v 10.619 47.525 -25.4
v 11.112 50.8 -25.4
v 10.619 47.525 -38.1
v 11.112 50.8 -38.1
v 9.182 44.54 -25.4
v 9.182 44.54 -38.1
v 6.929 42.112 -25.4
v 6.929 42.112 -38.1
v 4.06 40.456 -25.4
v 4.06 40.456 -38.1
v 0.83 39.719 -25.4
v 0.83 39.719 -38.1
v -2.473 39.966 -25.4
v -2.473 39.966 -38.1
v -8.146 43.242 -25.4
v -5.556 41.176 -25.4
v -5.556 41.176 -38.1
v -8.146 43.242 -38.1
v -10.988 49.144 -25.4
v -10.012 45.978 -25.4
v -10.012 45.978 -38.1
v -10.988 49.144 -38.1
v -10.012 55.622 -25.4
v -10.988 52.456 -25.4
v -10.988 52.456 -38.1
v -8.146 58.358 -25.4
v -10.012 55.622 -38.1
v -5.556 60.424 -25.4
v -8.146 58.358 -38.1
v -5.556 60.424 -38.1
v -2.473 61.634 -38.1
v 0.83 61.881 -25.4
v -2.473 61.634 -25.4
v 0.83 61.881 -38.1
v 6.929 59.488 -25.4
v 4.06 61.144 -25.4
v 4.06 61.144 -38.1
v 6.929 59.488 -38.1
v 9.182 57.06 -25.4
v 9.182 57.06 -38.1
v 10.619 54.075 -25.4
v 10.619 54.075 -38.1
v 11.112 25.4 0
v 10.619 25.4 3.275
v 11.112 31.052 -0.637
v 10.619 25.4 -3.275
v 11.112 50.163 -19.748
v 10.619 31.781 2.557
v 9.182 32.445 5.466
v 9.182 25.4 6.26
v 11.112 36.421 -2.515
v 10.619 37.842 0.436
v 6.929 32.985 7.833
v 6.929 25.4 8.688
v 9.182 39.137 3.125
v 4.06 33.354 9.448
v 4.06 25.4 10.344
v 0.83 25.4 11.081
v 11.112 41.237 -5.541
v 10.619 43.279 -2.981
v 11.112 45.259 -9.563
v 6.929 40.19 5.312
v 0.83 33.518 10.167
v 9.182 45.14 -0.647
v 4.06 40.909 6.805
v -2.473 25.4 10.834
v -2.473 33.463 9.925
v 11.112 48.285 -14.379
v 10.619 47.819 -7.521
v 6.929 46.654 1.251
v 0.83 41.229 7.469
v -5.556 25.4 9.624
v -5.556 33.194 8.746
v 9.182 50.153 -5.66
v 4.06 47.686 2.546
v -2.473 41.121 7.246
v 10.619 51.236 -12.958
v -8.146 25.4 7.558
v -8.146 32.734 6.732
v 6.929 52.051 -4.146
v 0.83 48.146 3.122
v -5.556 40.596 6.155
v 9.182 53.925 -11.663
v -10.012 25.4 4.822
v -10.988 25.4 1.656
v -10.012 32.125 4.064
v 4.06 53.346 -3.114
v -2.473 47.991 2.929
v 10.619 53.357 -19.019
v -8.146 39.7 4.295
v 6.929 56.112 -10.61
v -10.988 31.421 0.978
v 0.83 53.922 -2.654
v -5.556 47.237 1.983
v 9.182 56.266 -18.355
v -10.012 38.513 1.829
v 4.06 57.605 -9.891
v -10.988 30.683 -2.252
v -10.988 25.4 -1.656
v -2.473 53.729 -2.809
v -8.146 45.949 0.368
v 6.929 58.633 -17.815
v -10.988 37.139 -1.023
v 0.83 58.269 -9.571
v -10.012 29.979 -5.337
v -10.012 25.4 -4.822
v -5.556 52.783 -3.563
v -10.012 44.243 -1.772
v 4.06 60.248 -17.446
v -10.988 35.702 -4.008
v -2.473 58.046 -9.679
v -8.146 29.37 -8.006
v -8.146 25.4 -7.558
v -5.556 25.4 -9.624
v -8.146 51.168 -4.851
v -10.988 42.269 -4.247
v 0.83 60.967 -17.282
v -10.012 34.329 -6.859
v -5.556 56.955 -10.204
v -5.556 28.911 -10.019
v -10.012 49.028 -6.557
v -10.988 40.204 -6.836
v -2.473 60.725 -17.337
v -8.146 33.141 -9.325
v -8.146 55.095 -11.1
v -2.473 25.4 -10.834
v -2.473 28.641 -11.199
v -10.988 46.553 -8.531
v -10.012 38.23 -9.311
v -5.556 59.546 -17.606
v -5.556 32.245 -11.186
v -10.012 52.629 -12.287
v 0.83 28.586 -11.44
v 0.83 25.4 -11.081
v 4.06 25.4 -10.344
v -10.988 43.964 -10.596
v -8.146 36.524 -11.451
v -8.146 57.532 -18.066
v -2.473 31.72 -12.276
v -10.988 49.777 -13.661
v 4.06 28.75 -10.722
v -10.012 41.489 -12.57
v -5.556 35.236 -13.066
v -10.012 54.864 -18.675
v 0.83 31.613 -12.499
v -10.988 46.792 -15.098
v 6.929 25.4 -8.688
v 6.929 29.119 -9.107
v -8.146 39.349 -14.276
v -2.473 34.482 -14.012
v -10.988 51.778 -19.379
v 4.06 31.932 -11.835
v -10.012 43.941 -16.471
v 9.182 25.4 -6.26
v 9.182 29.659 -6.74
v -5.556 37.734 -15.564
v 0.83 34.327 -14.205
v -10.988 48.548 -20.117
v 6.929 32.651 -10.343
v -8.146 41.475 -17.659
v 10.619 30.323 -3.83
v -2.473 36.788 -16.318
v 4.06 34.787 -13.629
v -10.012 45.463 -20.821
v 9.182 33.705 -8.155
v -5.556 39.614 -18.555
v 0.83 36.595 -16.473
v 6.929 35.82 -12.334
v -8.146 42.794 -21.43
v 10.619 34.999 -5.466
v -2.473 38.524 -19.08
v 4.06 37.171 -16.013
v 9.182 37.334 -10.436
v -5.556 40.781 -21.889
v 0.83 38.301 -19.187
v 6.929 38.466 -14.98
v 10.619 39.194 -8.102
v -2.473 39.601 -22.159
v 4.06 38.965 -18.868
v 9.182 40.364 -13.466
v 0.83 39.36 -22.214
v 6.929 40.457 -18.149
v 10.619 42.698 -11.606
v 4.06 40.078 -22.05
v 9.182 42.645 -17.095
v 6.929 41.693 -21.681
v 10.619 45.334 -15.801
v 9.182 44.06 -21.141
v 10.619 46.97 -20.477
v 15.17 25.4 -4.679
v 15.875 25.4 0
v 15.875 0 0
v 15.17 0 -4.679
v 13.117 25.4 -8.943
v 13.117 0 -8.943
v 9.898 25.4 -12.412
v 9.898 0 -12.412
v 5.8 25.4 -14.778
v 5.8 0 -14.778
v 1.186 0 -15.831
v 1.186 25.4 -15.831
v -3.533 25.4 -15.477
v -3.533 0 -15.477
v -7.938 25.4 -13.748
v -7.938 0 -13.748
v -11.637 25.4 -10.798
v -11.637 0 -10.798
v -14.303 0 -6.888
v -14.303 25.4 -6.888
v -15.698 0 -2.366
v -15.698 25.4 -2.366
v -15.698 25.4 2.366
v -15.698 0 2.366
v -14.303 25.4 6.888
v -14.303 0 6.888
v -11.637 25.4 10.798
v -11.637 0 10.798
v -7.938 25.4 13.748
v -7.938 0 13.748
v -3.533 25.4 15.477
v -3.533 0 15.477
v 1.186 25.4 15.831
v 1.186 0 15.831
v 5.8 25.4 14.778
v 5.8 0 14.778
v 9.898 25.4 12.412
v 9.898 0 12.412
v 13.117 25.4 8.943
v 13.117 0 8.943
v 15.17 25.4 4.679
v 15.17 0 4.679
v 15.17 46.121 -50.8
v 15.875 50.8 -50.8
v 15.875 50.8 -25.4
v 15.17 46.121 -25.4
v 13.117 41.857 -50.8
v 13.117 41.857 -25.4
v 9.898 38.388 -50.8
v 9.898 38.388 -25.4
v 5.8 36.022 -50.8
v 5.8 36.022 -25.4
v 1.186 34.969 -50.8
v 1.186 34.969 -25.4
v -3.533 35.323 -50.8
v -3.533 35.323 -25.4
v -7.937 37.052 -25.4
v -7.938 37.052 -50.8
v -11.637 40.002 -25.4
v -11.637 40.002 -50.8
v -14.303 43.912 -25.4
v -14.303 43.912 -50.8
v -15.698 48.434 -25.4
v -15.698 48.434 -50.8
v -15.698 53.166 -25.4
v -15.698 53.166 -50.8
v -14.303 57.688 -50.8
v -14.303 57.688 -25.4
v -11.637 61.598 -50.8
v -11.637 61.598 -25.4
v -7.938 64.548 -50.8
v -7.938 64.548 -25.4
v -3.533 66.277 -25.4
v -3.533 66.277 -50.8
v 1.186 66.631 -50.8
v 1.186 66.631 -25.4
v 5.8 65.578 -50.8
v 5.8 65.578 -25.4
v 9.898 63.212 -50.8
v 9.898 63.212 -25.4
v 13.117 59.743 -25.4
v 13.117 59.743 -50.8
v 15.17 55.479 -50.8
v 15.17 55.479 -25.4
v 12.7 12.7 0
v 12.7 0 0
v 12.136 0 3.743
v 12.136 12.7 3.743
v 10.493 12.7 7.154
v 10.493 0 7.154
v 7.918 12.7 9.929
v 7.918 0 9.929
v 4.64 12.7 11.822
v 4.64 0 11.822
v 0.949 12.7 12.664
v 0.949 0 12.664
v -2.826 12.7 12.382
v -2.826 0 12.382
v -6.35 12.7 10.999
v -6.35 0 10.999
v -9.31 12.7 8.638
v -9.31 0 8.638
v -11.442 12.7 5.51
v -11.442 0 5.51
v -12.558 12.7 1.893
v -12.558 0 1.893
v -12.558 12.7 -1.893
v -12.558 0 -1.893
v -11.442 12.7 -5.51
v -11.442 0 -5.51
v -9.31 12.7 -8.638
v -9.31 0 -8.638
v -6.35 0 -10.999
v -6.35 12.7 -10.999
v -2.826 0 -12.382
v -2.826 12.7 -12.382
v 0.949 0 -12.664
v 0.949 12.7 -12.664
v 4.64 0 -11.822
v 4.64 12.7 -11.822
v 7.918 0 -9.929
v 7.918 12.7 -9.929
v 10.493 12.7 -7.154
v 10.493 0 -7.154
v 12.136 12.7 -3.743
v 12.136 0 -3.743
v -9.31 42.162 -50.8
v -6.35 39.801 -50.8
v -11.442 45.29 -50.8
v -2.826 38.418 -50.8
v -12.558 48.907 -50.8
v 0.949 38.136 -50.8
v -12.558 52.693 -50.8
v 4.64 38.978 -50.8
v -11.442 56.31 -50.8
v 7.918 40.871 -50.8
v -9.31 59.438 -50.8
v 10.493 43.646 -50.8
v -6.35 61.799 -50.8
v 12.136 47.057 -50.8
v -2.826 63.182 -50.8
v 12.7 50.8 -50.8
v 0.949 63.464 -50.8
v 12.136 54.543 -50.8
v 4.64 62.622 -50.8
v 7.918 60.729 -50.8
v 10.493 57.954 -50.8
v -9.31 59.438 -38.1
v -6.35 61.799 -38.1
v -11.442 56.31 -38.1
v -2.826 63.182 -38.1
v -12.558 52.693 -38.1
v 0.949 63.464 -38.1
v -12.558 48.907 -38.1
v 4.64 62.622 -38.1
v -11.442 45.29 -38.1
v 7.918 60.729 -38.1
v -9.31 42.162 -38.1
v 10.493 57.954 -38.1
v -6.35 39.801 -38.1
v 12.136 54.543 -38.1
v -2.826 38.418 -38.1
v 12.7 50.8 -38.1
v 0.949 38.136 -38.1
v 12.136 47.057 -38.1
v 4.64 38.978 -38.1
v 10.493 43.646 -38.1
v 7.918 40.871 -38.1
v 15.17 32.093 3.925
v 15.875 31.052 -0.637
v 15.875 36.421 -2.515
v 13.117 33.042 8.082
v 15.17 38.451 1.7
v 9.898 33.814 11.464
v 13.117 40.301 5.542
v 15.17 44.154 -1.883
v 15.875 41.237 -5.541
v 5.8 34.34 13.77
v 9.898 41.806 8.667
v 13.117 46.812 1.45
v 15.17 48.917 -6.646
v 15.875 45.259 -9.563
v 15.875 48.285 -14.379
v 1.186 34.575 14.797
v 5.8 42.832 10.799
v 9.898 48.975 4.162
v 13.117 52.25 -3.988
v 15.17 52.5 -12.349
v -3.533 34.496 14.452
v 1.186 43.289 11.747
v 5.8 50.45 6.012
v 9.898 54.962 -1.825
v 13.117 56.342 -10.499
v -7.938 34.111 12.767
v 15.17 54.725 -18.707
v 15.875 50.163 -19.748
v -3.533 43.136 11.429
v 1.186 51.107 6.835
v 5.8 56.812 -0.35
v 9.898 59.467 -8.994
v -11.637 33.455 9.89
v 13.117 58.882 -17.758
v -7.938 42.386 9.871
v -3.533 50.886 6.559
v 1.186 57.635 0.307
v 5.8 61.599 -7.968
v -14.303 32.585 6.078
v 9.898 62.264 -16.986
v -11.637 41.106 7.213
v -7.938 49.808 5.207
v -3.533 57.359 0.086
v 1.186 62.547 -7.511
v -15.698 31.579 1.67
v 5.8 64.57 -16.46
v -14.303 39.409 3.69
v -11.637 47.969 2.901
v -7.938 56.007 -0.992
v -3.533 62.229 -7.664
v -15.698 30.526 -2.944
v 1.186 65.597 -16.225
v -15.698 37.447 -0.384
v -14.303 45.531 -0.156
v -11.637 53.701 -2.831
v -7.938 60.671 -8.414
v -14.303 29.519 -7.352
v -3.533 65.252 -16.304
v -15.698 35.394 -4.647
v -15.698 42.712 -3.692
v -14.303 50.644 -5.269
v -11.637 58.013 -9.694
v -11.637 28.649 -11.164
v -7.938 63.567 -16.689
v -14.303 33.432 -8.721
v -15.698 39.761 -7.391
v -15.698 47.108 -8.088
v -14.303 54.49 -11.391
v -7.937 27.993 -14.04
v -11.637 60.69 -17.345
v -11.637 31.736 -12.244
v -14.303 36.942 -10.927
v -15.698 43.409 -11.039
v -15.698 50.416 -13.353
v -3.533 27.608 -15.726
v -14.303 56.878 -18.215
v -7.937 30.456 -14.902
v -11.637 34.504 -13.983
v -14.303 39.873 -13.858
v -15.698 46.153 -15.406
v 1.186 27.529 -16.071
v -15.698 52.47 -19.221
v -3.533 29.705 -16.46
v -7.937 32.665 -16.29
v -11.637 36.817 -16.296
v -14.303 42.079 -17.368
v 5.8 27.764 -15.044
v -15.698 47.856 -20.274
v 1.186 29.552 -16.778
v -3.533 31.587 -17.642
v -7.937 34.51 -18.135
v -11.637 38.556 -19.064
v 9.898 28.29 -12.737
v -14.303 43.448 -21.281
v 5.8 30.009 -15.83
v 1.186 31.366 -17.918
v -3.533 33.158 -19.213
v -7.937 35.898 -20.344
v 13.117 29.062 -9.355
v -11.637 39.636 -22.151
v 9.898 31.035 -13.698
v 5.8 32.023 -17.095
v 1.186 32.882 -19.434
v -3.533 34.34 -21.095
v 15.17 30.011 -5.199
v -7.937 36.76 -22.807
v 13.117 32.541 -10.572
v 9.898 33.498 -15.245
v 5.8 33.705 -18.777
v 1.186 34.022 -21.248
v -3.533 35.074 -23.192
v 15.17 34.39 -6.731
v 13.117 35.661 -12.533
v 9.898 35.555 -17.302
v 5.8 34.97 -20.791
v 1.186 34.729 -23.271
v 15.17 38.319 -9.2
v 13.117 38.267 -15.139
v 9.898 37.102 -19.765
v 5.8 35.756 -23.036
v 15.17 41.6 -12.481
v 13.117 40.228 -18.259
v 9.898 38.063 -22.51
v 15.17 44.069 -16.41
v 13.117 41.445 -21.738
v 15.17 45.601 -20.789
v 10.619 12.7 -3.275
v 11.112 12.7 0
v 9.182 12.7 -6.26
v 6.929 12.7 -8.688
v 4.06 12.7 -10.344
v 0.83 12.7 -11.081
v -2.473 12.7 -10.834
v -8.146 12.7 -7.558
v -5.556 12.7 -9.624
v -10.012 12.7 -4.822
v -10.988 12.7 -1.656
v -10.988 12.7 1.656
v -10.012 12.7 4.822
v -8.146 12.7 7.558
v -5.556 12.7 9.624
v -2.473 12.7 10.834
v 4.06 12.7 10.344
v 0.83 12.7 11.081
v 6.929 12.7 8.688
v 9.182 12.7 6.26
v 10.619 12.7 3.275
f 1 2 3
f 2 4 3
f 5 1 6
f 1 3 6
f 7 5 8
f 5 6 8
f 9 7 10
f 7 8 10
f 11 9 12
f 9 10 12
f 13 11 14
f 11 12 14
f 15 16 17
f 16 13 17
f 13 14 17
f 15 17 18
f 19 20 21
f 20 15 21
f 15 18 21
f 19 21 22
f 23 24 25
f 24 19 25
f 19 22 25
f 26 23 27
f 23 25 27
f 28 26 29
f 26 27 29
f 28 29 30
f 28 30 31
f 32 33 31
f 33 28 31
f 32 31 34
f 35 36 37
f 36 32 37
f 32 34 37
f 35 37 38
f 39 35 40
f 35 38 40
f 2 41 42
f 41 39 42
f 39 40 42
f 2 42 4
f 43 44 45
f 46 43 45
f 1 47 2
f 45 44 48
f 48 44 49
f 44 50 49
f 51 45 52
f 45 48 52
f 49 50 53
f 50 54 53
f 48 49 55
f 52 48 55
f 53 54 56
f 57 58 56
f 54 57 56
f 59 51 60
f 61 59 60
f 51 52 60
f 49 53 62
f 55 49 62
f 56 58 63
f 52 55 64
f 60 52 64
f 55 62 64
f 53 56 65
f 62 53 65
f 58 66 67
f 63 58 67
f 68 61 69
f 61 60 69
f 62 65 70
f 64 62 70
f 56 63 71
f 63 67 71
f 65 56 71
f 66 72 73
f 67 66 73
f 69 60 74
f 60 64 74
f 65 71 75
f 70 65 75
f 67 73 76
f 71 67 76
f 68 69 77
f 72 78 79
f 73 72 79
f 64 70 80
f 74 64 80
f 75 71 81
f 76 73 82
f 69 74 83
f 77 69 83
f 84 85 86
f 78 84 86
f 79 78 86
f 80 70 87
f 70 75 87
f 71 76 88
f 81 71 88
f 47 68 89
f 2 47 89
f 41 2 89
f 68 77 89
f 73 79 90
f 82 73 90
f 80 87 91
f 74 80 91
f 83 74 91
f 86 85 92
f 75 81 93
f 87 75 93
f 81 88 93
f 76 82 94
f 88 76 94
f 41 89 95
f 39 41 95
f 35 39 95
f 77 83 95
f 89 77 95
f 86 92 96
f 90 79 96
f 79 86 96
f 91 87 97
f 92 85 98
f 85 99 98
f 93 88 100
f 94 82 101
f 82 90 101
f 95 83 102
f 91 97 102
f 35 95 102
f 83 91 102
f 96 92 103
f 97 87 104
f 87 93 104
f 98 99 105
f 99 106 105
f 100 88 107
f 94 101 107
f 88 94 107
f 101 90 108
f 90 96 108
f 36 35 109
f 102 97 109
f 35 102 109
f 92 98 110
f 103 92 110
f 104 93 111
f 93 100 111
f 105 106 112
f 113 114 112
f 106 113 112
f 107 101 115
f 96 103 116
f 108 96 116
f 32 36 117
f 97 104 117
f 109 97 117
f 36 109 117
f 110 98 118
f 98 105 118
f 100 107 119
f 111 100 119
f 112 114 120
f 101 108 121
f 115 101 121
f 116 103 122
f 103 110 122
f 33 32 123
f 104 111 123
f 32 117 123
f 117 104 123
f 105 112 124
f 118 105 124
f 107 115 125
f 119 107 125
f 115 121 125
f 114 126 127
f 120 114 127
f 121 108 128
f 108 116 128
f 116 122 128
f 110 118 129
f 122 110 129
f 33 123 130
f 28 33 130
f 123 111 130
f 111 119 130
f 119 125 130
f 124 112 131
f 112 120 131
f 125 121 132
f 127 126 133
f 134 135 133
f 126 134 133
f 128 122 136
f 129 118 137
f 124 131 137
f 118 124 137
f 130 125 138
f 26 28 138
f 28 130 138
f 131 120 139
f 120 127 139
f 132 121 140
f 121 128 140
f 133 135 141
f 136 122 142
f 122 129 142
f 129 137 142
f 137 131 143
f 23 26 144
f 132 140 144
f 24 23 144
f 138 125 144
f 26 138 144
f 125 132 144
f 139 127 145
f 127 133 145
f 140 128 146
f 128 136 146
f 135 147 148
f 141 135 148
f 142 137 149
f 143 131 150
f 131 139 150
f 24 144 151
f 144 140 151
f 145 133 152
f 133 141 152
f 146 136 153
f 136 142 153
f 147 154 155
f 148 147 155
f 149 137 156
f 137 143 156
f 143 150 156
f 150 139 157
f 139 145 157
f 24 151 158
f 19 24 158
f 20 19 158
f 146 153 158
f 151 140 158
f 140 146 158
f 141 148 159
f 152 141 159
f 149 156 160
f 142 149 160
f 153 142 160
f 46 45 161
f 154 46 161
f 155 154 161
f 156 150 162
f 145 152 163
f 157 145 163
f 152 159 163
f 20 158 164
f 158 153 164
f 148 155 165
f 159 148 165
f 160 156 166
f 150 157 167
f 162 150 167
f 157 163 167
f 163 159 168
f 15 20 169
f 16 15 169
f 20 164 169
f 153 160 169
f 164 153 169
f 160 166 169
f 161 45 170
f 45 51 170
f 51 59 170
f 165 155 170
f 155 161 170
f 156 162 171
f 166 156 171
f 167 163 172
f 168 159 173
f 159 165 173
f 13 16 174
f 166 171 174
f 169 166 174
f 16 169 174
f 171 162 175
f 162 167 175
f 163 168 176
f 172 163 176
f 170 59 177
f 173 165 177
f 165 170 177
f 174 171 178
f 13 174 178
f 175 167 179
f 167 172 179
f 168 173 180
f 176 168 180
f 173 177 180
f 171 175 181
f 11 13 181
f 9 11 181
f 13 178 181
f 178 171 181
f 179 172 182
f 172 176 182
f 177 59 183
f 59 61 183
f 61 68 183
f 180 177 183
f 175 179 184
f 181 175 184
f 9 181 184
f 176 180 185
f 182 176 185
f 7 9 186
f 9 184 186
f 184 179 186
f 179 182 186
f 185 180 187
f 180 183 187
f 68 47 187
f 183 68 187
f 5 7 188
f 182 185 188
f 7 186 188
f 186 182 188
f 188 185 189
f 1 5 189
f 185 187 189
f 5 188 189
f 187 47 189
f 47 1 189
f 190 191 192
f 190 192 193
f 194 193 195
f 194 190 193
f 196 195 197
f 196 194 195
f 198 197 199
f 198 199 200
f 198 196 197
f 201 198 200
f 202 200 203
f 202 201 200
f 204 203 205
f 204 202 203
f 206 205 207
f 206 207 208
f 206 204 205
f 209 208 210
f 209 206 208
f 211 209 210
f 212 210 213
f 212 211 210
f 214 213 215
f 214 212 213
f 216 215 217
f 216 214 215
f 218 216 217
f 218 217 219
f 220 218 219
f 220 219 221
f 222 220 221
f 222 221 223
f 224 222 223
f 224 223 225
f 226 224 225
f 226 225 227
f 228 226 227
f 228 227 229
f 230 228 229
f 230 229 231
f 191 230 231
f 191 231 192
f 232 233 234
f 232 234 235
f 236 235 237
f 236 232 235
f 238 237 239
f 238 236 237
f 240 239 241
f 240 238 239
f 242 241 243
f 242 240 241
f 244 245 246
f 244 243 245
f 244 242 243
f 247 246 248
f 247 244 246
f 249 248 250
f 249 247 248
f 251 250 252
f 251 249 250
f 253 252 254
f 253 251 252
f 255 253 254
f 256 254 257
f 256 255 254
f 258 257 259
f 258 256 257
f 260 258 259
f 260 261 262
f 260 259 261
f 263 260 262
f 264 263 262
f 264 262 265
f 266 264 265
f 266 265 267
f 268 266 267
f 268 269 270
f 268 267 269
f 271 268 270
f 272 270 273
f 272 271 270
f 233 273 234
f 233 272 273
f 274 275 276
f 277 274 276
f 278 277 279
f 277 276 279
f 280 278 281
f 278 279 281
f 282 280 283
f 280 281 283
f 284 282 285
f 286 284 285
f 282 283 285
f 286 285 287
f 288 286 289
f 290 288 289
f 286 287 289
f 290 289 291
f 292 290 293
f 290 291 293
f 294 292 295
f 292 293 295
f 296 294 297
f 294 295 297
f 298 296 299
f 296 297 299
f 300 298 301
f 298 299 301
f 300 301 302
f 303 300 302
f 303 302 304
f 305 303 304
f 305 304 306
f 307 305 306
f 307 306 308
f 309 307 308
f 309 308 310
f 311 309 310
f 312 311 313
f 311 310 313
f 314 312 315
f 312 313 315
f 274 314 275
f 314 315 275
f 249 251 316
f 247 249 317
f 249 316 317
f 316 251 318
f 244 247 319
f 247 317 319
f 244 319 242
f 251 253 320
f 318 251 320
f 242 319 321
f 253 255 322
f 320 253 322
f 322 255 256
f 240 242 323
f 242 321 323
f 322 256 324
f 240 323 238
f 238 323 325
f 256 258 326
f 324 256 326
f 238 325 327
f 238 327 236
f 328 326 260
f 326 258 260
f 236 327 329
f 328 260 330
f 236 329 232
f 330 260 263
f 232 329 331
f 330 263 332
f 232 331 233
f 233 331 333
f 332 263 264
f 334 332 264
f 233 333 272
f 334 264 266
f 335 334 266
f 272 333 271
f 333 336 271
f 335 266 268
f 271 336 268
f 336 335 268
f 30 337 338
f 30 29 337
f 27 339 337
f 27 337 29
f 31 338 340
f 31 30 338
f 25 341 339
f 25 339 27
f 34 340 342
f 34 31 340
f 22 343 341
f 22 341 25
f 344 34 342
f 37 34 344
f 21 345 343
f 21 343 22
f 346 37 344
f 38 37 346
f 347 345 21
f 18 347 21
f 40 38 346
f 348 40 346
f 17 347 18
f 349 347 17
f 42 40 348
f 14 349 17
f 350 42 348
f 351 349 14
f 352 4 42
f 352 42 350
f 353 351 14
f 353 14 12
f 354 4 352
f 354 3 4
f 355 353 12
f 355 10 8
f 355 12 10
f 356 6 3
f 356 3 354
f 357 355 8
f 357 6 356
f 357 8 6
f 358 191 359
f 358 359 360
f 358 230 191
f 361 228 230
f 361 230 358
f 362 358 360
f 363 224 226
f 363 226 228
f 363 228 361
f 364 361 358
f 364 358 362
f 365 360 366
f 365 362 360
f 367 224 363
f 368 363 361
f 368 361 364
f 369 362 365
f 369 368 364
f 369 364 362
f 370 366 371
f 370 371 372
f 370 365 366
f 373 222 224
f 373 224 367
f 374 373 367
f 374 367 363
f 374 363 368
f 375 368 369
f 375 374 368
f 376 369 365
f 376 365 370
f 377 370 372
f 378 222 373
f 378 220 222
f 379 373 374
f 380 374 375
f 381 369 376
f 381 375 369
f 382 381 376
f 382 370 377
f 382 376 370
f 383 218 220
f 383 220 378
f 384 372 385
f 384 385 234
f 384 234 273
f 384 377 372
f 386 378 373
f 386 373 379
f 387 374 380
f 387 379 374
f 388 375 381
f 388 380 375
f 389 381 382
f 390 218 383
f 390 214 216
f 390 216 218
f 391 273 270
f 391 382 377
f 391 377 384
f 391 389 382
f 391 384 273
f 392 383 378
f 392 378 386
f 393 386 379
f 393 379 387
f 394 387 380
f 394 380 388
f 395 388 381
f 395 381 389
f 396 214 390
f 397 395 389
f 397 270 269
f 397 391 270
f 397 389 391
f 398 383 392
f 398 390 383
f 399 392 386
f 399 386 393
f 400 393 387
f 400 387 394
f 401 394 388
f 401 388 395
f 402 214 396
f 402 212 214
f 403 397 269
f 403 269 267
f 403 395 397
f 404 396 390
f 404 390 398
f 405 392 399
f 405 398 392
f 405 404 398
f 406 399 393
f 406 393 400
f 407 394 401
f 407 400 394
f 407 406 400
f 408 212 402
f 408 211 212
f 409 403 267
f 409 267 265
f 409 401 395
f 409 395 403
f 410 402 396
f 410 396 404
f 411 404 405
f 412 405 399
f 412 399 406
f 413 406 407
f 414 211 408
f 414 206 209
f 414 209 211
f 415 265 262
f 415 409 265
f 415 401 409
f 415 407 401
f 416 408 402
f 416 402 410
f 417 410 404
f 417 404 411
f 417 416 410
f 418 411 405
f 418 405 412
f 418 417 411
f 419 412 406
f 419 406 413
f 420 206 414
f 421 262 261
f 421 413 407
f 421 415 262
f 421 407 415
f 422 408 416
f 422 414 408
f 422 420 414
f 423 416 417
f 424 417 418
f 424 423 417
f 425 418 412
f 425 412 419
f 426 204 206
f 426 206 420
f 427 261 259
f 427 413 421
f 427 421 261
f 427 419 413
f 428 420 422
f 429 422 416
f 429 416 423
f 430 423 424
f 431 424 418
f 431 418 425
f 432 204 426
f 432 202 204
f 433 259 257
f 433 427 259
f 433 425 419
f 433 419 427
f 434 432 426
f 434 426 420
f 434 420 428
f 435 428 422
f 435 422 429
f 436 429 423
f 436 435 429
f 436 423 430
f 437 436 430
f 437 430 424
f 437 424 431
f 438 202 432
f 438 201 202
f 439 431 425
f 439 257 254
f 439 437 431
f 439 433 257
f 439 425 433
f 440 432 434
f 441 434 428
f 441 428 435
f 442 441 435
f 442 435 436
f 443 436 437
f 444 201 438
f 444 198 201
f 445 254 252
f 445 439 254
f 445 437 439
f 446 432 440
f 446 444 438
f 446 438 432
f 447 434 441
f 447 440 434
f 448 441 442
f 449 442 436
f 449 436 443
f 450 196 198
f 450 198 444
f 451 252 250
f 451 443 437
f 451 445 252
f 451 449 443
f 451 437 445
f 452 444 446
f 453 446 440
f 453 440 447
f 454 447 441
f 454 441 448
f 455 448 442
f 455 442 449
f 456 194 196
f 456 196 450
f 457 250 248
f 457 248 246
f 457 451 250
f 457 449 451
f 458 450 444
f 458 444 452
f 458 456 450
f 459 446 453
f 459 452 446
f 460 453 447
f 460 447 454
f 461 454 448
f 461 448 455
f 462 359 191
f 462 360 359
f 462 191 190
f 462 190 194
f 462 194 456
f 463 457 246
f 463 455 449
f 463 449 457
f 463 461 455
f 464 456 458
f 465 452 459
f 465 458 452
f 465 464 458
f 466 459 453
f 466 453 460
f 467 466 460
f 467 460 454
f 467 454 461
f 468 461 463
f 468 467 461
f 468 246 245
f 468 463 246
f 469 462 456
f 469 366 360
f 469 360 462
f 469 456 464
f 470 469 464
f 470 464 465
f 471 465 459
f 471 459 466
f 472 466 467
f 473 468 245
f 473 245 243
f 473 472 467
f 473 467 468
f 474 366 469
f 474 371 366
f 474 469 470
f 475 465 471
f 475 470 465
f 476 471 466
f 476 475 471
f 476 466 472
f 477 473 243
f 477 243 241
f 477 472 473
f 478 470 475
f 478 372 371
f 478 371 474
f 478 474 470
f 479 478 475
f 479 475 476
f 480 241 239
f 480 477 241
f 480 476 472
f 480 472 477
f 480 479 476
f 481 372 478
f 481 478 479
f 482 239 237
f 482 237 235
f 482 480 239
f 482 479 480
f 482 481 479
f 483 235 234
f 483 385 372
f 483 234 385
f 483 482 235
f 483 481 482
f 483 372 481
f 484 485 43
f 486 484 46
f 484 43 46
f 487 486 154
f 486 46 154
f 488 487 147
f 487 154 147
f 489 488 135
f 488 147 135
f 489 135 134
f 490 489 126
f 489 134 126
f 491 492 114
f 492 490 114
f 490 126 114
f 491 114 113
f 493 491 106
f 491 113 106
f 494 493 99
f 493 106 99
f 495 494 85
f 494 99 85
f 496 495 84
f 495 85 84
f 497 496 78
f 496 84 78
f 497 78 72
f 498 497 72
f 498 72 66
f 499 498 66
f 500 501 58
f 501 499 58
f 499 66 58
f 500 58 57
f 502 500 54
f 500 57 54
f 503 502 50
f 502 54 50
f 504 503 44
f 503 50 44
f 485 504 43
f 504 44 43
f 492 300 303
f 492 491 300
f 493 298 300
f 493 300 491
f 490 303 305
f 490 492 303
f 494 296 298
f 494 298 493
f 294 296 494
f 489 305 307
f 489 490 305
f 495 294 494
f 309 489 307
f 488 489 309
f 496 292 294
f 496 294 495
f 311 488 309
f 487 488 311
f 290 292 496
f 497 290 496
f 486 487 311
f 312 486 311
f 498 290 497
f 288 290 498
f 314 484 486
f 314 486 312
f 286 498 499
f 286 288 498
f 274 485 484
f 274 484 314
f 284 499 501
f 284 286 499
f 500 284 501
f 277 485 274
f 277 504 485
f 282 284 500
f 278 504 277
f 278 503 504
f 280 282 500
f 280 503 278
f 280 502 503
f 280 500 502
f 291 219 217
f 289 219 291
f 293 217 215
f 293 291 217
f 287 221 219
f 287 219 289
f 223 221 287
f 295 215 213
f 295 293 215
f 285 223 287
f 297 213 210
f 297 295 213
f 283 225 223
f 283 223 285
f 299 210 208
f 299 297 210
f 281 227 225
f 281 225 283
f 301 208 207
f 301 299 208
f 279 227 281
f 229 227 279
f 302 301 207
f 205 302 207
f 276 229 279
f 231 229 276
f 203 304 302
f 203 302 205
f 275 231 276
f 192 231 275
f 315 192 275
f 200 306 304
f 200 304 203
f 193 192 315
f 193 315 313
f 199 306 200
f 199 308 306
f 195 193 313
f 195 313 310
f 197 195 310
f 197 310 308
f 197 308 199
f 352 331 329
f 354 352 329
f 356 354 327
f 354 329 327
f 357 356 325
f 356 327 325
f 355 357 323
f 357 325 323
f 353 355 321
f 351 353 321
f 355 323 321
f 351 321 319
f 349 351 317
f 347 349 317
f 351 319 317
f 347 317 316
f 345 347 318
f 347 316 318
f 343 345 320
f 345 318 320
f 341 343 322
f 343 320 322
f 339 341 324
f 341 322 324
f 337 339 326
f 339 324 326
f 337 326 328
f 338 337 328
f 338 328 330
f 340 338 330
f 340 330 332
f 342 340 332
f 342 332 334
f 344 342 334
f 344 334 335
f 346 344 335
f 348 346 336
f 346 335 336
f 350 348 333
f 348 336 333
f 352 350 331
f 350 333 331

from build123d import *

# Parameters (mm, degrees)
F0_R     = 15.875
F0_R_2   = 11.1125
F3_R     = 12.7
F3_R_2   = 11.1125
F4_DEPTH = 12.7
F5_R     = 12.7
F5_R_2   = 11.1125
F6_DEPTH = 12.7


with BuildPart() as f2:
    # F2: sweep along a path in F1
    with BuildLine(Plane.YZ) as f2_path:
        Line((0, 0), (25.4, 0))
        ThreePointArc((25.4, 0), (43.3605122421, -7.4394877579), (50.8, -25.4))
        Line((50.8, -25.4), (50.8, -50.8))
    # F0 (on Front) → F2 (sweep)
    with BuildSketch(Plane.XZ):
        Circle(F0_R)
        Circle(F0_R_2, mode=Mode.SUBTRACT)
    sweep(path=f2_path.line)

    # F3 (on face) → F4 (cut)
    with BuildSketch(Plane.XZ):
        Circle(F3_R)
        Circle(F3_R_2, mode=Mode.SUBTRACT)
    extrude(amount=-F4_DEPTH, mode=Mode.SUBTRACT)

    # F5 (on face) → F6 (cut)
    with BuildSketch(Plane(origin=(0, 0, -50.8), x_dir=(1, 0, 0), z_dir=(0, 0, -1))):
        with Locations((0, -50.8)):
            Circle(F5_R)
        with Locations((0, -50.8)):
            Circle(F5_R_2, mode=Mode.SUBTRACT)
    extrude(amount=-F6_DEPTH, mode=Mode.SUBTRACT)


solid = f2.part
